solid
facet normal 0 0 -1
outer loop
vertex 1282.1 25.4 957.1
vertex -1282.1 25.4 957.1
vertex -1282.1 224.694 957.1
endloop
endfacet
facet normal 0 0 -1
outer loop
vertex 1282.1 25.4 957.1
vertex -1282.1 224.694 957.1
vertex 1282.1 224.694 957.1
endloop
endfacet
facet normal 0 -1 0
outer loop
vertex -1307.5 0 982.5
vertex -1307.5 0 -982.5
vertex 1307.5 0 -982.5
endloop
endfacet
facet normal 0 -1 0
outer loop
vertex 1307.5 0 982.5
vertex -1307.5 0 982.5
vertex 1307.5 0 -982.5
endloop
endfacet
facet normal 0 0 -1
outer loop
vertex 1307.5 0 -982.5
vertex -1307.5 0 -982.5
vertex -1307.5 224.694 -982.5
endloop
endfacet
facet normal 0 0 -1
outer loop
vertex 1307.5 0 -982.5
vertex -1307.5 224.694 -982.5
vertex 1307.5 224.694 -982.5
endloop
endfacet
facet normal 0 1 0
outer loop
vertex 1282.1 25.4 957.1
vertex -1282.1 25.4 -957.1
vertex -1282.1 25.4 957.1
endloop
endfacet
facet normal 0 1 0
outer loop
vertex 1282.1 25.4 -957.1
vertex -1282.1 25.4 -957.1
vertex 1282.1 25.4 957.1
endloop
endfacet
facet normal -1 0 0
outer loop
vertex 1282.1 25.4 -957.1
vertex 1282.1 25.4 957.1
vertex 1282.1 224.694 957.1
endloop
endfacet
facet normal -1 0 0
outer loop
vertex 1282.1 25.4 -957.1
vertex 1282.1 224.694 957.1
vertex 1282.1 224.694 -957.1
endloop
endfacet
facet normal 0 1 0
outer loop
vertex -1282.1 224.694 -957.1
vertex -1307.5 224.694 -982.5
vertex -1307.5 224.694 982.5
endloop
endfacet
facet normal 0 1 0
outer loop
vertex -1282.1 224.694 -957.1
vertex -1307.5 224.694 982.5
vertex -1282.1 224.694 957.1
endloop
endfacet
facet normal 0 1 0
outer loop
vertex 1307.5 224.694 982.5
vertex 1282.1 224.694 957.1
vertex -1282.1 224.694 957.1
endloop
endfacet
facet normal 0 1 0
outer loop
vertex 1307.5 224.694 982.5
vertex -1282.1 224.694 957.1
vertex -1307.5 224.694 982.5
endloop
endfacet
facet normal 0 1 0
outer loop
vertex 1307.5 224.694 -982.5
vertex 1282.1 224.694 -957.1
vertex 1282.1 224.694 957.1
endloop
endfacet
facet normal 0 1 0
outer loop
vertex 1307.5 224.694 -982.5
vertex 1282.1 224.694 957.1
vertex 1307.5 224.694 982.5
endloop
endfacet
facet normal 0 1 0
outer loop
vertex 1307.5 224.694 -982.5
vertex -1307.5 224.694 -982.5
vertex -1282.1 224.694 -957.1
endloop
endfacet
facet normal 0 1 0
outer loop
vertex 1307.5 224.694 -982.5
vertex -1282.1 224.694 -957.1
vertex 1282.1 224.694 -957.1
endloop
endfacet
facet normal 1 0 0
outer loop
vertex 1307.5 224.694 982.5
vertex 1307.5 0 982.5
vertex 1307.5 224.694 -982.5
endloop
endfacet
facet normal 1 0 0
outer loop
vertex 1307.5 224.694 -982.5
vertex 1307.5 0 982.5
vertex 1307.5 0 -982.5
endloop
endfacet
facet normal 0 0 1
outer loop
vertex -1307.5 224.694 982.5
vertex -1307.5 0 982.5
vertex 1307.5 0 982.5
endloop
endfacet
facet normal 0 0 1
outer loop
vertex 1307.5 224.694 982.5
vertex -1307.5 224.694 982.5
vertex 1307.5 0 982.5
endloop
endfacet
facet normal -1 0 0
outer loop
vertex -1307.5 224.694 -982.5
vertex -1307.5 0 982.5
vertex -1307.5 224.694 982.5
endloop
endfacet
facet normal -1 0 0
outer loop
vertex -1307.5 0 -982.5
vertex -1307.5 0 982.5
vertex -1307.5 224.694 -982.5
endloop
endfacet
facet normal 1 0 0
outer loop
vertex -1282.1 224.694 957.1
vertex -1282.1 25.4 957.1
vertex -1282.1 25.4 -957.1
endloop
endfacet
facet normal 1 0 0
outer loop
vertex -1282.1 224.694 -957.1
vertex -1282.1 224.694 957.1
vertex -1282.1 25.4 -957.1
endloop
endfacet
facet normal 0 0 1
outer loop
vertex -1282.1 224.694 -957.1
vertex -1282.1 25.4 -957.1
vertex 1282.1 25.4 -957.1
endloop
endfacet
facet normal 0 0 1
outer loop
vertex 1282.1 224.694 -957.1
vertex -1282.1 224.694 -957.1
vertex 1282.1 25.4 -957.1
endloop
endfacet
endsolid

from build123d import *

# Parameters (mm, degrees)
SKETCH1_W           = 2615
SKETCH1_H           = 1965
BOSS_EXTRUDE1_DEPTH = 260
SHELL1_T            = 25.4
SKETCH2_W           = 2615
SKETCH2_H           = 1965
CUT_EXTRUDE1_DEPTH  = 35.306


with BuildPart() as part:
    # Sketch1 → Boss-Extrude1 (new body)
    with BuildSketch(Plane(origin=(0, 0, 0), x_dir=(1, 0, 0), z_dir=(0, 1, 0))):
        Rectangle(SKETCH1_W, SKETCH1_H)
    extrude(amount=BOSS_EXTRUDE1_DEPTH)

    # Shell1 (no face opened: a closed hollow body)
    add(offset(amount=-SHELL1_T, mode=Mode.PRIVATE), mode=Mode.SUBTRACT)

    # Sketch2 → Cut-Extrude1 (cut)
    with BuildSketch(Plane(origin=(0, 260, 0), x_dir=(1, 0, 0), z_dir=(0, 1, 0))):
        Rectangle(SKETCH2_W, SKETCH2_H)
    extrude(amount=-CUT_EXTRUDE1_DEPTH, mode=Mode.SUBTRACT)


solid = part.part
